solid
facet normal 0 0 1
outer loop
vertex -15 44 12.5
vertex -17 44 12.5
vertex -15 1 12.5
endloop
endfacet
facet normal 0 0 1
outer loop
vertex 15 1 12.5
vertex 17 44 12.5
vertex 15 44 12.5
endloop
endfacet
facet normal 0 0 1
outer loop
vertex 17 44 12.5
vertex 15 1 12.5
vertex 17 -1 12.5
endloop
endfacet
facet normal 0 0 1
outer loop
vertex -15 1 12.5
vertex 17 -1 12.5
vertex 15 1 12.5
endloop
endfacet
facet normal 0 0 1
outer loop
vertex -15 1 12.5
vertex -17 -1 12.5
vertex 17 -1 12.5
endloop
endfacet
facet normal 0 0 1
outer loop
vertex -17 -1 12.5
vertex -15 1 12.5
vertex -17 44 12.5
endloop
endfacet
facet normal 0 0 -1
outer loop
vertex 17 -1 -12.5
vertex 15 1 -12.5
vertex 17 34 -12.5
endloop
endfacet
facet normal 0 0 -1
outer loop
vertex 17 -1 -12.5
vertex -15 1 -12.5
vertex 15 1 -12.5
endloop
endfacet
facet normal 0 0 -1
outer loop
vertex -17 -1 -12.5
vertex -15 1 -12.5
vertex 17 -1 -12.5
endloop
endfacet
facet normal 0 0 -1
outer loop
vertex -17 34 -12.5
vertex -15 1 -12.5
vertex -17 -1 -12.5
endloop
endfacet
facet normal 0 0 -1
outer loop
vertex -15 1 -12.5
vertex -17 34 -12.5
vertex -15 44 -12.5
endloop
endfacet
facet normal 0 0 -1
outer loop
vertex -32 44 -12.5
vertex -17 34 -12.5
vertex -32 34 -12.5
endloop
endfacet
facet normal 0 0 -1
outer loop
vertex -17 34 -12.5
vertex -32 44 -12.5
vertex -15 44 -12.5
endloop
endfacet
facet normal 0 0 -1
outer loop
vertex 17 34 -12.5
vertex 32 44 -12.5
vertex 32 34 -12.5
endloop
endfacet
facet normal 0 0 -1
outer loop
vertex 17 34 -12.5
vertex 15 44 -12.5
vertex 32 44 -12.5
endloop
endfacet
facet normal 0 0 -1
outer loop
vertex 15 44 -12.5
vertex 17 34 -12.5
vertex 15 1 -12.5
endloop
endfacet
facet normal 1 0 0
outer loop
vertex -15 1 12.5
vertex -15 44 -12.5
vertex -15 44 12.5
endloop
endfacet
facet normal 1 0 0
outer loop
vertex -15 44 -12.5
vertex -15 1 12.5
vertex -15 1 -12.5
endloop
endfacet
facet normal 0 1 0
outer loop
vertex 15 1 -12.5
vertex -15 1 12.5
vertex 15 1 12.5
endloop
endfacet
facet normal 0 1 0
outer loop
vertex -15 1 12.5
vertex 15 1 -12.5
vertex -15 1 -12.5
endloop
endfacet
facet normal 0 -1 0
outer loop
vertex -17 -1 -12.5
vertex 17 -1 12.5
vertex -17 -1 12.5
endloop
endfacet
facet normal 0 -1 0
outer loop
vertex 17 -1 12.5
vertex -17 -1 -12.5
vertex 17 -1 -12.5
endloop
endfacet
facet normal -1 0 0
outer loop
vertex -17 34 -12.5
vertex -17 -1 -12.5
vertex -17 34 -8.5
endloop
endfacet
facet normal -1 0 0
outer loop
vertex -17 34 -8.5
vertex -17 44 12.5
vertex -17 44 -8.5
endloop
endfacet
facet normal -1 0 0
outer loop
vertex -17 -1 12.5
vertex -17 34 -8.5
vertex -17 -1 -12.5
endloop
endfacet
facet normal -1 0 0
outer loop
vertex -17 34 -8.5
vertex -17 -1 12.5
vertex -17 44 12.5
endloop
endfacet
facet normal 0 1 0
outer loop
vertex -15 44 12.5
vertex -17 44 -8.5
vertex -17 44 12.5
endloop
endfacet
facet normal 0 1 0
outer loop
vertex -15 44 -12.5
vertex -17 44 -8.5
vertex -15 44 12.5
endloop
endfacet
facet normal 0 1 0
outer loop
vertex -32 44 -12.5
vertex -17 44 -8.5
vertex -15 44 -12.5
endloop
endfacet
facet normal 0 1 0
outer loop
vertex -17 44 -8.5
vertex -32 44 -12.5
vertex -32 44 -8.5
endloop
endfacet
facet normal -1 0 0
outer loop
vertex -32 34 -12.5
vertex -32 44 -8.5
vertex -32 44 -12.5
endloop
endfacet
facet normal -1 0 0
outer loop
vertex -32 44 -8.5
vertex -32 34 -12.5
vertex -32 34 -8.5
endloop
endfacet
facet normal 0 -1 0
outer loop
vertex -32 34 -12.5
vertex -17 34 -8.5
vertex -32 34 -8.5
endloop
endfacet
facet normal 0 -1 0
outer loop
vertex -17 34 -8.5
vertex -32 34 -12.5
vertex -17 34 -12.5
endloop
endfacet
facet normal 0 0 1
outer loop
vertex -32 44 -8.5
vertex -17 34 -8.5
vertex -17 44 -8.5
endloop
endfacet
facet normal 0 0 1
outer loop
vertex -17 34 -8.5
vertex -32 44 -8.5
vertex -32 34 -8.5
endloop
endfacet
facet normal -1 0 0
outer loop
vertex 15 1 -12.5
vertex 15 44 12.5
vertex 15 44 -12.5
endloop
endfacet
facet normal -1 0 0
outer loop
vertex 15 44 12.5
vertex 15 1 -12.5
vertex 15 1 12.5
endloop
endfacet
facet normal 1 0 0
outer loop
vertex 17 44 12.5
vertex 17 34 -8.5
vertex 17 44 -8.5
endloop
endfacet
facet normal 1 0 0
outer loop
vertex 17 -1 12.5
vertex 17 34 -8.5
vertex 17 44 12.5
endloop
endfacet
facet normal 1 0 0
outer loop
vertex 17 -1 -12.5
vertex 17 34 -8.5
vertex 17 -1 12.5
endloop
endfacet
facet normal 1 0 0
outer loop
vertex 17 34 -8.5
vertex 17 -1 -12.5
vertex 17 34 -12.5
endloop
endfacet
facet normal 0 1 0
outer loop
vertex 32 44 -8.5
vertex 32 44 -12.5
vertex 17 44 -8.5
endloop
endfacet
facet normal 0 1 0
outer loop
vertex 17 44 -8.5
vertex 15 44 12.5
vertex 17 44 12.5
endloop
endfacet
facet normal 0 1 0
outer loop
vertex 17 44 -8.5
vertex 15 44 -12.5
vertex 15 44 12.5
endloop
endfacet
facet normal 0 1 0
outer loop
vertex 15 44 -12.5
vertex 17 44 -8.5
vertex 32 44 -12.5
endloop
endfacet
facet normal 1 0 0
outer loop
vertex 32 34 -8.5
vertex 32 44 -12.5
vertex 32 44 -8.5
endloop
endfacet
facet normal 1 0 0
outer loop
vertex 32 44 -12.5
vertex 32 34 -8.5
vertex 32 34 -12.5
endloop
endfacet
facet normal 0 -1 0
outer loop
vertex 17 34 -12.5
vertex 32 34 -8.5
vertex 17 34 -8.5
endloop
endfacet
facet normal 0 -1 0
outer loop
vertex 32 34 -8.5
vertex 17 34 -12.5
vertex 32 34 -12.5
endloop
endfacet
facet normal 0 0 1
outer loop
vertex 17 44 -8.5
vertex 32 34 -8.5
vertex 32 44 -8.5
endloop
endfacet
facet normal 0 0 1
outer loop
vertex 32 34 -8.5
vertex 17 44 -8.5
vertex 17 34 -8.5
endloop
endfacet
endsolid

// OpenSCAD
CARA_X=30;
CARA_Y=2;
CARA_Z=25;

SUELO_X=15;
SUELO_Y=2;
SUELO_Z=10;


translate([-CARA_X/4,0,0])
cube([CARA_X/2,CARA_Y,CARA_Z], center = true);

rotate([0,0,90])
translate([CARA_X*1.5/2-CARA_Y/2,CARA_X/2+CARA_Y/2,0])
cube([CARA_X*1.5,CARA_Y,CARA_Z], center = true);

translate([-(CARA_X/4 + SUELO_X + SUELO_Y),CARA_X*1.5-SUELO_Z/2-SUELO_Y/2,-(CARA_Z/2-SUELO_Y)])
rotate([90,0,0])
cube([SUELO_X,SUELO_Y+2,SUELO_Z], center = true);

translate([CARA_X/4,0,0])
cube([CARA_X/2,CARA_Y,CARA_Z], center = true);

rotate([0,0,90])
translate([CARA_X*1.5/2-CARA_Y/2,-(CARA_X/2+CARA_Y/2),0])
cube([CARA_X*1.5,CARA_Y,CARA_Z], center = true);

translate([(CARA_X/4 + SUELO_X + SUELO_Y),CARA_X*1.5-SUELO_Z/2-SUELO_Y/2,-(CARA_Z/2-SUELO_Y)])
rotate([90,0,0])
cube([SUELO_X,SUELO_Y+2,SUELO_Z], center = true);
